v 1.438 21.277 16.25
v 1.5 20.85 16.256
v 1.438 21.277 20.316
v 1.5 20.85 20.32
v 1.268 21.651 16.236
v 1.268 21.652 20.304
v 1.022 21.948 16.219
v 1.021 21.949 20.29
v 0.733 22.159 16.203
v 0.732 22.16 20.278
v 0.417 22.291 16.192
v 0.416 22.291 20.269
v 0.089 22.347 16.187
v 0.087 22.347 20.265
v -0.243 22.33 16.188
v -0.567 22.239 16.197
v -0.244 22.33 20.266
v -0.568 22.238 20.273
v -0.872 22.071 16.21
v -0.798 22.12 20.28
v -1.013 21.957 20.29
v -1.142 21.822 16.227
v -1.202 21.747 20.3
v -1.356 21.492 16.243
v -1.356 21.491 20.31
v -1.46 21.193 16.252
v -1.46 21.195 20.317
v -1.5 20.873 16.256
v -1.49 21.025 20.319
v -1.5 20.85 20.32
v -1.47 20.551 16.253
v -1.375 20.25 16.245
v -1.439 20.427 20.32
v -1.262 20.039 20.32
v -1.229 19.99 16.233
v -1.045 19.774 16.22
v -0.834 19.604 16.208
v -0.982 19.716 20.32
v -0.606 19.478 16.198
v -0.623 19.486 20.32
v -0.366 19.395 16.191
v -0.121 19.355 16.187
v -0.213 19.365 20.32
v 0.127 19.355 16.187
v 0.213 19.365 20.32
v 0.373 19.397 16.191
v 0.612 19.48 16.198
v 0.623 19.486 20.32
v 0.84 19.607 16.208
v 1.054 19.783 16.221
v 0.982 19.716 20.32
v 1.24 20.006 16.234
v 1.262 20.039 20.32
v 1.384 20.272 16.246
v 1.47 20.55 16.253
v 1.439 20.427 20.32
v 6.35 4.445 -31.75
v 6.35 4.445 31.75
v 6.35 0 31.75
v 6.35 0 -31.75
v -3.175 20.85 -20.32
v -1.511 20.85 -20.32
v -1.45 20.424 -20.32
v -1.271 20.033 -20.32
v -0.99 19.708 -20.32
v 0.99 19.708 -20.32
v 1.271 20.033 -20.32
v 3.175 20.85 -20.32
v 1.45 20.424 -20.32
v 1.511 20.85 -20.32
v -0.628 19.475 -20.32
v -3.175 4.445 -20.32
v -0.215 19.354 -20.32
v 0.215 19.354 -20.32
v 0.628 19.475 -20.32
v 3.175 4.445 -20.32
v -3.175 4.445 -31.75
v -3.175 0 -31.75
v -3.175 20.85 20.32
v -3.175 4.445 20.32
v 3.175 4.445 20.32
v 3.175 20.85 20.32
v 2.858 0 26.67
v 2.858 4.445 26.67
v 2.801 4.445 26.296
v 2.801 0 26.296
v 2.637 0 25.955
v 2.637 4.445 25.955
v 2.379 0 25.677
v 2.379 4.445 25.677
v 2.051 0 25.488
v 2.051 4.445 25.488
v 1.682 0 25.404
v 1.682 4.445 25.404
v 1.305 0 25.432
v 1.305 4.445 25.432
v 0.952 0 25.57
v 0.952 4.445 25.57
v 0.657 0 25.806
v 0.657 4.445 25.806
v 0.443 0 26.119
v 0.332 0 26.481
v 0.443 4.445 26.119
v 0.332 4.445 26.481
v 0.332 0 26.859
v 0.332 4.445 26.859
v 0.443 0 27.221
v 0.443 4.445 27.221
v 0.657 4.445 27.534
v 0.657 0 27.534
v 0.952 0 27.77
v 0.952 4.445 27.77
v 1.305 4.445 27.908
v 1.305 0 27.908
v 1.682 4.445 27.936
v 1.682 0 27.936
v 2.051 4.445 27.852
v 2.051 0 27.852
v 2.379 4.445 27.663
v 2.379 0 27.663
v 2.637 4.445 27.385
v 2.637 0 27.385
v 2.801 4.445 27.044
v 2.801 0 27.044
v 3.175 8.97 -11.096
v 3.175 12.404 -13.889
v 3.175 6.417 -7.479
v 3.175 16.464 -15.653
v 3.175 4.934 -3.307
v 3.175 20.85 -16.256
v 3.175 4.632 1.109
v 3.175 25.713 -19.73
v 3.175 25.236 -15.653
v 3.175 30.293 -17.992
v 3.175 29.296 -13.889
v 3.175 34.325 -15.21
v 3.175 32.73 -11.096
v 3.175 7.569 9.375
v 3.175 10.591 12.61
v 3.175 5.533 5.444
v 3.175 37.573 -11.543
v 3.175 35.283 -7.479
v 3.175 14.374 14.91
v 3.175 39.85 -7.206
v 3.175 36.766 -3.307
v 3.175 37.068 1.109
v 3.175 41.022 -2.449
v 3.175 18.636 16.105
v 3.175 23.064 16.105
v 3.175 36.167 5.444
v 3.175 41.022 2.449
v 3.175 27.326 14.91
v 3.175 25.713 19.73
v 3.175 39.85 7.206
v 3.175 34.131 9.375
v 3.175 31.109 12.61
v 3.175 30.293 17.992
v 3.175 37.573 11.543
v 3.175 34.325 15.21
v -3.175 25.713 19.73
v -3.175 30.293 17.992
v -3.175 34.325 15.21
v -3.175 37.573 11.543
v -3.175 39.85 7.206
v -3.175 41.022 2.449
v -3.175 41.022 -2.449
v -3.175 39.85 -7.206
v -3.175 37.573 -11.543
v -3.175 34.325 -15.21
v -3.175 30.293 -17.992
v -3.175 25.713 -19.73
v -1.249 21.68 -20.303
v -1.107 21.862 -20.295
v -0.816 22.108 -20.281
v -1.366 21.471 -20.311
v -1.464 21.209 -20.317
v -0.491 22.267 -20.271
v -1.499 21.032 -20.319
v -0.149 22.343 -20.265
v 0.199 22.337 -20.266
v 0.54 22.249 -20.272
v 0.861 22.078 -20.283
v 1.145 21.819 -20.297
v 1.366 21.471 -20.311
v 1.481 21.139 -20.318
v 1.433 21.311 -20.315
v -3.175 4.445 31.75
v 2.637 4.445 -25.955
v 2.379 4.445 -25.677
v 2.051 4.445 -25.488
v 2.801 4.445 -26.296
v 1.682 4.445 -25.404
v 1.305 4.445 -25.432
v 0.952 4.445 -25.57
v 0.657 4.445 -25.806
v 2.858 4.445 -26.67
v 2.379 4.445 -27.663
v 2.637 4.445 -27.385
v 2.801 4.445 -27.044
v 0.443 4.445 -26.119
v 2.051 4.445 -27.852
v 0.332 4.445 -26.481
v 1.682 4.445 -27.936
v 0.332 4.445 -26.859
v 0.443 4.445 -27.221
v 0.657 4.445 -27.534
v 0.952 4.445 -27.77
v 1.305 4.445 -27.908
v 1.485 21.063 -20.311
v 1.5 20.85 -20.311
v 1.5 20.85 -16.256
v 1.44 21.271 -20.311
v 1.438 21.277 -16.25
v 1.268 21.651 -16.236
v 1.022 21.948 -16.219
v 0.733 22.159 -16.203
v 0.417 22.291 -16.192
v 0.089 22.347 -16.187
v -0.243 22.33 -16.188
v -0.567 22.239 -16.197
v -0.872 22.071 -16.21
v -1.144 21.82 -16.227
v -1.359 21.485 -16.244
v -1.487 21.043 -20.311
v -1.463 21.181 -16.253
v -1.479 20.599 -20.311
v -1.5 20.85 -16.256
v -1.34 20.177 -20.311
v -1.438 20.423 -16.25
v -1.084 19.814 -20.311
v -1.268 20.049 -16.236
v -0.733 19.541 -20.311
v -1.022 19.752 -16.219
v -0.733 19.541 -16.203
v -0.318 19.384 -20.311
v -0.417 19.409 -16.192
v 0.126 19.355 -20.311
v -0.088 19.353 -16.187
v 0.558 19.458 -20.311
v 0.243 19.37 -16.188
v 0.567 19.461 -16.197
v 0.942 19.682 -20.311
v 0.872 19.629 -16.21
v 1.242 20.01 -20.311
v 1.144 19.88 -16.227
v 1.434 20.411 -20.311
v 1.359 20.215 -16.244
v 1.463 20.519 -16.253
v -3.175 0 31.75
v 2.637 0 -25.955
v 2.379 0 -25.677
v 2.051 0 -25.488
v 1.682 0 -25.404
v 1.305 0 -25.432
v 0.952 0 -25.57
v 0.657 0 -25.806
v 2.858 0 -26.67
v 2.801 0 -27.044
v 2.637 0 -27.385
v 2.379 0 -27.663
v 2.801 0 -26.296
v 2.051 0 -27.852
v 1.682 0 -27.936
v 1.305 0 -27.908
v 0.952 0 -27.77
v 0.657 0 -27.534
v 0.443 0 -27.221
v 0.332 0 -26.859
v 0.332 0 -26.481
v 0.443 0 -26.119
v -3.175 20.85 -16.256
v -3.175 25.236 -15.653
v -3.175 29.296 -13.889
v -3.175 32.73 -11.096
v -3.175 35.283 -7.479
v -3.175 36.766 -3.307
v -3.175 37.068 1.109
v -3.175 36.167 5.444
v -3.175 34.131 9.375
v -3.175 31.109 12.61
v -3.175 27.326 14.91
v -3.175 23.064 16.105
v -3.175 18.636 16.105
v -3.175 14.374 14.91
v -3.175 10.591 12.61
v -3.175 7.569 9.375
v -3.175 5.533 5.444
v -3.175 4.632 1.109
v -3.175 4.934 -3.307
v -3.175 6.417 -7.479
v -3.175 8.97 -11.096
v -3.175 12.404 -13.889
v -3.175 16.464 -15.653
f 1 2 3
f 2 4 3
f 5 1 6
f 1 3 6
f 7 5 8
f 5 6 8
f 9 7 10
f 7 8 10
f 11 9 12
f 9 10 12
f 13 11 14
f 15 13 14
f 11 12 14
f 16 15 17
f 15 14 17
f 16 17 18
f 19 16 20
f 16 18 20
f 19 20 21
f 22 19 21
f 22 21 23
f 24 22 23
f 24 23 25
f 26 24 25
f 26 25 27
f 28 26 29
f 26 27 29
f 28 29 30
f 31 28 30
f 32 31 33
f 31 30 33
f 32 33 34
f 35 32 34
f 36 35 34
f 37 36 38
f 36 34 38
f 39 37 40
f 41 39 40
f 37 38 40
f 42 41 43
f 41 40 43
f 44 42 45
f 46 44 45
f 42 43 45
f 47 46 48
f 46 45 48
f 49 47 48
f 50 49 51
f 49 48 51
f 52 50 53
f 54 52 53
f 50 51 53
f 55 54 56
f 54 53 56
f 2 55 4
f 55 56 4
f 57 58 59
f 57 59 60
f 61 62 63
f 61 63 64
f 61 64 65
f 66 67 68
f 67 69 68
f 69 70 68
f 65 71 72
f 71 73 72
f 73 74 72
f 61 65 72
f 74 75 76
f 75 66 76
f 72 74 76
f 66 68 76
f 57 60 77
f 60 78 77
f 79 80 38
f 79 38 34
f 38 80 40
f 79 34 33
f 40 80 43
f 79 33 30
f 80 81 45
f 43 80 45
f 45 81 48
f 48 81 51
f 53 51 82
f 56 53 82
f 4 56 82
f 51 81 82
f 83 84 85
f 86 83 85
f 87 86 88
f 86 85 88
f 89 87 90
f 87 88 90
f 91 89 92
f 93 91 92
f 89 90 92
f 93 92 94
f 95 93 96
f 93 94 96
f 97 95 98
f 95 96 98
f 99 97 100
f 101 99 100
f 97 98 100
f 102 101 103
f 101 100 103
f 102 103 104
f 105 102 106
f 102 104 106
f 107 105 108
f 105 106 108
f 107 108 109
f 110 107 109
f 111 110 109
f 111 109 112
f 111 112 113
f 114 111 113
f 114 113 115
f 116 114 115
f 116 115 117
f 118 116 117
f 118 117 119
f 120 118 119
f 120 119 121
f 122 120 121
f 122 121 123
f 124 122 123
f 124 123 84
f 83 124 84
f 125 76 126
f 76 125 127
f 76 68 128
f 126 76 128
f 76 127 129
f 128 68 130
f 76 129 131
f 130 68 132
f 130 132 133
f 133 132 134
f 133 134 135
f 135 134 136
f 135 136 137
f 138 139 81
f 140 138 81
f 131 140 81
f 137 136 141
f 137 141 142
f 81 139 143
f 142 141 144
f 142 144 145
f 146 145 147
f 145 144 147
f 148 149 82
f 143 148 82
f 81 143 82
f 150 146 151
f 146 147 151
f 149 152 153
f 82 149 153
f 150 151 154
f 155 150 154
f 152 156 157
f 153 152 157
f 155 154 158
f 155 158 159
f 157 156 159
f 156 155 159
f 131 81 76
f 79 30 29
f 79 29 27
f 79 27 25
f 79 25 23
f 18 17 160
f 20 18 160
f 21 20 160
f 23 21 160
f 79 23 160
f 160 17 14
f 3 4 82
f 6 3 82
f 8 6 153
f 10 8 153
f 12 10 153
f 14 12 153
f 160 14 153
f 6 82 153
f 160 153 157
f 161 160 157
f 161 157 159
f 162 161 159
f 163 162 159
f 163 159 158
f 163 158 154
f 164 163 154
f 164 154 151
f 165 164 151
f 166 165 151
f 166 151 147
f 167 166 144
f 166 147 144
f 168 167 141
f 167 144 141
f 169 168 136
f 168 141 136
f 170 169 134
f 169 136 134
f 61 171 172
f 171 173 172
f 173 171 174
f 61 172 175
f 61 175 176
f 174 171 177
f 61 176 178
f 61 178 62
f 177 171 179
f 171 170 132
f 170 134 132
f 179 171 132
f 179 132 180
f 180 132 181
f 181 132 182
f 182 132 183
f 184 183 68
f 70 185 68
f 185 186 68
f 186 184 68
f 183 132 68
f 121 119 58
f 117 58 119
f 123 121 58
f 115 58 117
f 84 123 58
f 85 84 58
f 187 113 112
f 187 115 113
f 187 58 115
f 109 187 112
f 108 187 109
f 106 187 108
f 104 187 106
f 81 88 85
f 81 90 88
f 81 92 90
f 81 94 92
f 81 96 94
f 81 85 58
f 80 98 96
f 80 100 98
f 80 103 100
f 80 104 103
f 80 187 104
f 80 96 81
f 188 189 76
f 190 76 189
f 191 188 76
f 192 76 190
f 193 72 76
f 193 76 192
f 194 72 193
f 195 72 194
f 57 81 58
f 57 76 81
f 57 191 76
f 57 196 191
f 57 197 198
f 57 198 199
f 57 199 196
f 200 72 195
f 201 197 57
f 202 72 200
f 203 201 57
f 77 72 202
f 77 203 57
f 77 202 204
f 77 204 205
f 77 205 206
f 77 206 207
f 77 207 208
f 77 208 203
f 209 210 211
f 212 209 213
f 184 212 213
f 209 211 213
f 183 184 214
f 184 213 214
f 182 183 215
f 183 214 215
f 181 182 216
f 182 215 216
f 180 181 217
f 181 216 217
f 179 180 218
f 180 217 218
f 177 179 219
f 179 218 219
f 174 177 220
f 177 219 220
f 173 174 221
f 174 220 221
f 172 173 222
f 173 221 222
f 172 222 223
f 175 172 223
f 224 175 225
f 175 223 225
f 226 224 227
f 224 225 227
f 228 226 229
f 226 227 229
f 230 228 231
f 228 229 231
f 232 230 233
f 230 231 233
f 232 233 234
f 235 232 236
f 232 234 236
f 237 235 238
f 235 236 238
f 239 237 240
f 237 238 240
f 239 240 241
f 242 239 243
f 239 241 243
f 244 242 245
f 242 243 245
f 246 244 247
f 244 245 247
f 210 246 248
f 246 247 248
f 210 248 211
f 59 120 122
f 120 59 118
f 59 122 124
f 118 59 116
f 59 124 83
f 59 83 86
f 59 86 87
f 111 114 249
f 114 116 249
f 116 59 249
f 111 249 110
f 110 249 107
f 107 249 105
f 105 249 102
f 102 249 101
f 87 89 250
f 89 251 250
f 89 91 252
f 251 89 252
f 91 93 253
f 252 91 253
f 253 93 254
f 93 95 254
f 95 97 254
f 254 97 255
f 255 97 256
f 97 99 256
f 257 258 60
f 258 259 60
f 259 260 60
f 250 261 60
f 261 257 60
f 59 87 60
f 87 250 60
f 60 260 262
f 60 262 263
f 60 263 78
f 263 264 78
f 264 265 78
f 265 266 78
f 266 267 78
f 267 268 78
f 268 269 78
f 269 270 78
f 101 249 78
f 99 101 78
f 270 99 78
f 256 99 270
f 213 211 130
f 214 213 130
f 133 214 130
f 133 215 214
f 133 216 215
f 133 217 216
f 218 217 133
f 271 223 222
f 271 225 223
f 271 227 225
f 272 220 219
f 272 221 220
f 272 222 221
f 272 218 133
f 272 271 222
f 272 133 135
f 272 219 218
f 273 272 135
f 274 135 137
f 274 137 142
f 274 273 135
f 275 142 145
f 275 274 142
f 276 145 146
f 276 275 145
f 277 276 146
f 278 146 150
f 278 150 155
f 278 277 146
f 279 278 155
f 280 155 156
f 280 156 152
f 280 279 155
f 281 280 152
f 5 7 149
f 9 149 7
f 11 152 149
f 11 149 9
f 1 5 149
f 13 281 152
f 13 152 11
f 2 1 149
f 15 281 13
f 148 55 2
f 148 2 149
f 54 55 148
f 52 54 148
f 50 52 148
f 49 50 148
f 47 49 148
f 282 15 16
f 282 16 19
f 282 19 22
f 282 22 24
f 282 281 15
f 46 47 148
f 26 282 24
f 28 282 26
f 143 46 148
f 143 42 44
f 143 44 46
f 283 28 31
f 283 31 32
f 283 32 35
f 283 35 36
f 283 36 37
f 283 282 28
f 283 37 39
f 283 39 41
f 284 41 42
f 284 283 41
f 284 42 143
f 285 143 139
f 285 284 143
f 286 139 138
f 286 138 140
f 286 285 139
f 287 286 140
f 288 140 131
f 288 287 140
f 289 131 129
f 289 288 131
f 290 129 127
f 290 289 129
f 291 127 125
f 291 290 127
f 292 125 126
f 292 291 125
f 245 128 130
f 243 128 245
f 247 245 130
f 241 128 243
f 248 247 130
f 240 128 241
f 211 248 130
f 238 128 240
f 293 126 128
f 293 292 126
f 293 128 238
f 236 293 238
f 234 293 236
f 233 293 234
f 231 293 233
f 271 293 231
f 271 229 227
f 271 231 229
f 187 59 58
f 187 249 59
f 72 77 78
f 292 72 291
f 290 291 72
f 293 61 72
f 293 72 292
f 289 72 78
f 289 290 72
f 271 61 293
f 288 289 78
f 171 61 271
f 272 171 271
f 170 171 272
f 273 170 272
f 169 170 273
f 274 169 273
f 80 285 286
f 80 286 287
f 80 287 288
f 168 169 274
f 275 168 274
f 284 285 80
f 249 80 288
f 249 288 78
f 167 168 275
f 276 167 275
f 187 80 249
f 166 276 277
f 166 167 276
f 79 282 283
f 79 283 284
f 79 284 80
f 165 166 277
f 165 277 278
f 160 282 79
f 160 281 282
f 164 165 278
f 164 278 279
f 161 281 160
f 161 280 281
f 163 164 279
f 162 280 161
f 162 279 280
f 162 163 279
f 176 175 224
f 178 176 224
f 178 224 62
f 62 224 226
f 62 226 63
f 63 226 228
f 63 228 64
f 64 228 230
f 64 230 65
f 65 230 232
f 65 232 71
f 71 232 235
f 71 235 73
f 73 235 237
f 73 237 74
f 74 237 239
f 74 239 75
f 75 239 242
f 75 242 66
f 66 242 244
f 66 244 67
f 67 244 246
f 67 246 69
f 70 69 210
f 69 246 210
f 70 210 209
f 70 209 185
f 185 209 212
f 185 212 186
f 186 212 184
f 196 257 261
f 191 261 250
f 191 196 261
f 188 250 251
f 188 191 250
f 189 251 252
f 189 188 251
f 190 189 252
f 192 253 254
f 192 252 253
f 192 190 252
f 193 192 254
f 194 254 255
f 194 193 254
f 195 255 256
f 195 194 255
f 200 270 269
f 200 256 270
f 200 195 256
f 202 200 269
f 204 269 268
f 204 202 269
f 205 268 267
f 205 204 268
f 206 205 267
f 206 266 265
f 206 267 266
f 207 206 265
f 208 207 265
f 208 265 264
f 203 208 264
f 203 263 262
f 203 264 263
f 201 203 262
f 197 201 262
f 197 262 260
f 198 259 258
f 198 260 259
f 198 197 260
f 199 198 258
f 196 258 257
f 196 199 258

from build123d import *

# Parameters (mm, degrees)
SKETCH2_R                                         = 16.256
BOSS_EXTRUDE1_DEPTH                               = 3.175
SKETCH3_W                                         = 63.5
SKETCH3_H                                         = 4.445
BOSS_EXTRUDE2_DEPTH                               = 3.175
CSK_FOR_0_FLAT_HEAD_MACHINE_SCREW_100_D           = 3.000000096
CSK_FOR_0_FLAT_HEAD_MACHINE_SCREW_100_CSINK_D     = 3.0226
CSK_FOR_0_FLAT_HEAD_MACHINE_SCREW_100_CSINK_ANGLE = 100
SKETCH6_R                                         = 1.27
CUT_EXTRUDE1_DEPTH                                = 6.35


with BuildPart() as part:
    # Sketch2 → Boss-Extrude1 (new body, symmetric)
    with BuildSketch(Plane(origin=(0, 0, 0), x_dir=(0, 0, -1), z_dir=(1, 0, 0))):
        Polygon((-20.32, 4.445), (20.32, 4.445), (31.75, 4.445), (31.75, 0), (-31.75, 0), (-31.75, 4.445), align=None)
        with BuildLine():
            ThreePointArc((-20.32, 20.85), (0, 41.17), (20.32, 20.85))
            Line((20.32, 20.85), (20.32, 4.445))
            Line((20.32, 4.445), (-20.32, 4.445))
            Line((-20.32, 4.445), (-20.32, 20.85))
        make_face()
        with Locations((0, 20.85)):
            Circle(SKETCH2_R, mode=Mode.SUBTRACT)
    extrude(amount=BOSS_EXTRUDE1_DEPTH, both=True)

    # Sketch3 → Boss-Extrude2 (add)
    with BuildSketch(Plane(origin=(3.175, 0, 0), x_dir=(0, 0, -1), z_dir=(1, 0, 0))):
        with Locations((0, 2.2225)):
            Rectangle(SKETCH3_W, SKETCH3_H)
    extrude(amount=BOSS_EXTRUDE2_DEPTH)

    # CSK for #0 Flat Head Machine Screw (100)1 (through all)
    with Locations(Plane(origin=(0, 0, -20.32), x_dir=(-1, 0, 0), z_dir=(0, 0, -1))):
        with Locations((0, 20.85)):
            CounterSinkHole(CSK_FOR_0_FLAT_HEAD_MACHINE_SCREW_100_D / 2, CSK_FOR_0_FLAT_HEAD_MACHINE_SCREW_100_CSINK_D / 2, counter_sink_angle=CSK_FOR_0_FLAT_HEAD_MACHINE_SCREW_100_CSINK_ANGLE)

    # Sketch6 → Cut-Extrude1 (cut)
    with BuildSketch(Plane(origin=(0, 4.445, 0), x_dir=(1, 0, 0), z_dir=(0, 1, 0))):
        with Locations((1.5875, -26.67)):
            Circle(SKETCH6_R)
    cut_extrude1 = extrude(amount=-CUT_EXTRUDE1_DEPTH, mode=Mode.SUBTRACT)

    # Mirror2: Cut-Extrude1 across plane
    add(cut_extrude1.mirror(Plane.XY), mode=Mode.SUBTRACT)


solid = part.part
